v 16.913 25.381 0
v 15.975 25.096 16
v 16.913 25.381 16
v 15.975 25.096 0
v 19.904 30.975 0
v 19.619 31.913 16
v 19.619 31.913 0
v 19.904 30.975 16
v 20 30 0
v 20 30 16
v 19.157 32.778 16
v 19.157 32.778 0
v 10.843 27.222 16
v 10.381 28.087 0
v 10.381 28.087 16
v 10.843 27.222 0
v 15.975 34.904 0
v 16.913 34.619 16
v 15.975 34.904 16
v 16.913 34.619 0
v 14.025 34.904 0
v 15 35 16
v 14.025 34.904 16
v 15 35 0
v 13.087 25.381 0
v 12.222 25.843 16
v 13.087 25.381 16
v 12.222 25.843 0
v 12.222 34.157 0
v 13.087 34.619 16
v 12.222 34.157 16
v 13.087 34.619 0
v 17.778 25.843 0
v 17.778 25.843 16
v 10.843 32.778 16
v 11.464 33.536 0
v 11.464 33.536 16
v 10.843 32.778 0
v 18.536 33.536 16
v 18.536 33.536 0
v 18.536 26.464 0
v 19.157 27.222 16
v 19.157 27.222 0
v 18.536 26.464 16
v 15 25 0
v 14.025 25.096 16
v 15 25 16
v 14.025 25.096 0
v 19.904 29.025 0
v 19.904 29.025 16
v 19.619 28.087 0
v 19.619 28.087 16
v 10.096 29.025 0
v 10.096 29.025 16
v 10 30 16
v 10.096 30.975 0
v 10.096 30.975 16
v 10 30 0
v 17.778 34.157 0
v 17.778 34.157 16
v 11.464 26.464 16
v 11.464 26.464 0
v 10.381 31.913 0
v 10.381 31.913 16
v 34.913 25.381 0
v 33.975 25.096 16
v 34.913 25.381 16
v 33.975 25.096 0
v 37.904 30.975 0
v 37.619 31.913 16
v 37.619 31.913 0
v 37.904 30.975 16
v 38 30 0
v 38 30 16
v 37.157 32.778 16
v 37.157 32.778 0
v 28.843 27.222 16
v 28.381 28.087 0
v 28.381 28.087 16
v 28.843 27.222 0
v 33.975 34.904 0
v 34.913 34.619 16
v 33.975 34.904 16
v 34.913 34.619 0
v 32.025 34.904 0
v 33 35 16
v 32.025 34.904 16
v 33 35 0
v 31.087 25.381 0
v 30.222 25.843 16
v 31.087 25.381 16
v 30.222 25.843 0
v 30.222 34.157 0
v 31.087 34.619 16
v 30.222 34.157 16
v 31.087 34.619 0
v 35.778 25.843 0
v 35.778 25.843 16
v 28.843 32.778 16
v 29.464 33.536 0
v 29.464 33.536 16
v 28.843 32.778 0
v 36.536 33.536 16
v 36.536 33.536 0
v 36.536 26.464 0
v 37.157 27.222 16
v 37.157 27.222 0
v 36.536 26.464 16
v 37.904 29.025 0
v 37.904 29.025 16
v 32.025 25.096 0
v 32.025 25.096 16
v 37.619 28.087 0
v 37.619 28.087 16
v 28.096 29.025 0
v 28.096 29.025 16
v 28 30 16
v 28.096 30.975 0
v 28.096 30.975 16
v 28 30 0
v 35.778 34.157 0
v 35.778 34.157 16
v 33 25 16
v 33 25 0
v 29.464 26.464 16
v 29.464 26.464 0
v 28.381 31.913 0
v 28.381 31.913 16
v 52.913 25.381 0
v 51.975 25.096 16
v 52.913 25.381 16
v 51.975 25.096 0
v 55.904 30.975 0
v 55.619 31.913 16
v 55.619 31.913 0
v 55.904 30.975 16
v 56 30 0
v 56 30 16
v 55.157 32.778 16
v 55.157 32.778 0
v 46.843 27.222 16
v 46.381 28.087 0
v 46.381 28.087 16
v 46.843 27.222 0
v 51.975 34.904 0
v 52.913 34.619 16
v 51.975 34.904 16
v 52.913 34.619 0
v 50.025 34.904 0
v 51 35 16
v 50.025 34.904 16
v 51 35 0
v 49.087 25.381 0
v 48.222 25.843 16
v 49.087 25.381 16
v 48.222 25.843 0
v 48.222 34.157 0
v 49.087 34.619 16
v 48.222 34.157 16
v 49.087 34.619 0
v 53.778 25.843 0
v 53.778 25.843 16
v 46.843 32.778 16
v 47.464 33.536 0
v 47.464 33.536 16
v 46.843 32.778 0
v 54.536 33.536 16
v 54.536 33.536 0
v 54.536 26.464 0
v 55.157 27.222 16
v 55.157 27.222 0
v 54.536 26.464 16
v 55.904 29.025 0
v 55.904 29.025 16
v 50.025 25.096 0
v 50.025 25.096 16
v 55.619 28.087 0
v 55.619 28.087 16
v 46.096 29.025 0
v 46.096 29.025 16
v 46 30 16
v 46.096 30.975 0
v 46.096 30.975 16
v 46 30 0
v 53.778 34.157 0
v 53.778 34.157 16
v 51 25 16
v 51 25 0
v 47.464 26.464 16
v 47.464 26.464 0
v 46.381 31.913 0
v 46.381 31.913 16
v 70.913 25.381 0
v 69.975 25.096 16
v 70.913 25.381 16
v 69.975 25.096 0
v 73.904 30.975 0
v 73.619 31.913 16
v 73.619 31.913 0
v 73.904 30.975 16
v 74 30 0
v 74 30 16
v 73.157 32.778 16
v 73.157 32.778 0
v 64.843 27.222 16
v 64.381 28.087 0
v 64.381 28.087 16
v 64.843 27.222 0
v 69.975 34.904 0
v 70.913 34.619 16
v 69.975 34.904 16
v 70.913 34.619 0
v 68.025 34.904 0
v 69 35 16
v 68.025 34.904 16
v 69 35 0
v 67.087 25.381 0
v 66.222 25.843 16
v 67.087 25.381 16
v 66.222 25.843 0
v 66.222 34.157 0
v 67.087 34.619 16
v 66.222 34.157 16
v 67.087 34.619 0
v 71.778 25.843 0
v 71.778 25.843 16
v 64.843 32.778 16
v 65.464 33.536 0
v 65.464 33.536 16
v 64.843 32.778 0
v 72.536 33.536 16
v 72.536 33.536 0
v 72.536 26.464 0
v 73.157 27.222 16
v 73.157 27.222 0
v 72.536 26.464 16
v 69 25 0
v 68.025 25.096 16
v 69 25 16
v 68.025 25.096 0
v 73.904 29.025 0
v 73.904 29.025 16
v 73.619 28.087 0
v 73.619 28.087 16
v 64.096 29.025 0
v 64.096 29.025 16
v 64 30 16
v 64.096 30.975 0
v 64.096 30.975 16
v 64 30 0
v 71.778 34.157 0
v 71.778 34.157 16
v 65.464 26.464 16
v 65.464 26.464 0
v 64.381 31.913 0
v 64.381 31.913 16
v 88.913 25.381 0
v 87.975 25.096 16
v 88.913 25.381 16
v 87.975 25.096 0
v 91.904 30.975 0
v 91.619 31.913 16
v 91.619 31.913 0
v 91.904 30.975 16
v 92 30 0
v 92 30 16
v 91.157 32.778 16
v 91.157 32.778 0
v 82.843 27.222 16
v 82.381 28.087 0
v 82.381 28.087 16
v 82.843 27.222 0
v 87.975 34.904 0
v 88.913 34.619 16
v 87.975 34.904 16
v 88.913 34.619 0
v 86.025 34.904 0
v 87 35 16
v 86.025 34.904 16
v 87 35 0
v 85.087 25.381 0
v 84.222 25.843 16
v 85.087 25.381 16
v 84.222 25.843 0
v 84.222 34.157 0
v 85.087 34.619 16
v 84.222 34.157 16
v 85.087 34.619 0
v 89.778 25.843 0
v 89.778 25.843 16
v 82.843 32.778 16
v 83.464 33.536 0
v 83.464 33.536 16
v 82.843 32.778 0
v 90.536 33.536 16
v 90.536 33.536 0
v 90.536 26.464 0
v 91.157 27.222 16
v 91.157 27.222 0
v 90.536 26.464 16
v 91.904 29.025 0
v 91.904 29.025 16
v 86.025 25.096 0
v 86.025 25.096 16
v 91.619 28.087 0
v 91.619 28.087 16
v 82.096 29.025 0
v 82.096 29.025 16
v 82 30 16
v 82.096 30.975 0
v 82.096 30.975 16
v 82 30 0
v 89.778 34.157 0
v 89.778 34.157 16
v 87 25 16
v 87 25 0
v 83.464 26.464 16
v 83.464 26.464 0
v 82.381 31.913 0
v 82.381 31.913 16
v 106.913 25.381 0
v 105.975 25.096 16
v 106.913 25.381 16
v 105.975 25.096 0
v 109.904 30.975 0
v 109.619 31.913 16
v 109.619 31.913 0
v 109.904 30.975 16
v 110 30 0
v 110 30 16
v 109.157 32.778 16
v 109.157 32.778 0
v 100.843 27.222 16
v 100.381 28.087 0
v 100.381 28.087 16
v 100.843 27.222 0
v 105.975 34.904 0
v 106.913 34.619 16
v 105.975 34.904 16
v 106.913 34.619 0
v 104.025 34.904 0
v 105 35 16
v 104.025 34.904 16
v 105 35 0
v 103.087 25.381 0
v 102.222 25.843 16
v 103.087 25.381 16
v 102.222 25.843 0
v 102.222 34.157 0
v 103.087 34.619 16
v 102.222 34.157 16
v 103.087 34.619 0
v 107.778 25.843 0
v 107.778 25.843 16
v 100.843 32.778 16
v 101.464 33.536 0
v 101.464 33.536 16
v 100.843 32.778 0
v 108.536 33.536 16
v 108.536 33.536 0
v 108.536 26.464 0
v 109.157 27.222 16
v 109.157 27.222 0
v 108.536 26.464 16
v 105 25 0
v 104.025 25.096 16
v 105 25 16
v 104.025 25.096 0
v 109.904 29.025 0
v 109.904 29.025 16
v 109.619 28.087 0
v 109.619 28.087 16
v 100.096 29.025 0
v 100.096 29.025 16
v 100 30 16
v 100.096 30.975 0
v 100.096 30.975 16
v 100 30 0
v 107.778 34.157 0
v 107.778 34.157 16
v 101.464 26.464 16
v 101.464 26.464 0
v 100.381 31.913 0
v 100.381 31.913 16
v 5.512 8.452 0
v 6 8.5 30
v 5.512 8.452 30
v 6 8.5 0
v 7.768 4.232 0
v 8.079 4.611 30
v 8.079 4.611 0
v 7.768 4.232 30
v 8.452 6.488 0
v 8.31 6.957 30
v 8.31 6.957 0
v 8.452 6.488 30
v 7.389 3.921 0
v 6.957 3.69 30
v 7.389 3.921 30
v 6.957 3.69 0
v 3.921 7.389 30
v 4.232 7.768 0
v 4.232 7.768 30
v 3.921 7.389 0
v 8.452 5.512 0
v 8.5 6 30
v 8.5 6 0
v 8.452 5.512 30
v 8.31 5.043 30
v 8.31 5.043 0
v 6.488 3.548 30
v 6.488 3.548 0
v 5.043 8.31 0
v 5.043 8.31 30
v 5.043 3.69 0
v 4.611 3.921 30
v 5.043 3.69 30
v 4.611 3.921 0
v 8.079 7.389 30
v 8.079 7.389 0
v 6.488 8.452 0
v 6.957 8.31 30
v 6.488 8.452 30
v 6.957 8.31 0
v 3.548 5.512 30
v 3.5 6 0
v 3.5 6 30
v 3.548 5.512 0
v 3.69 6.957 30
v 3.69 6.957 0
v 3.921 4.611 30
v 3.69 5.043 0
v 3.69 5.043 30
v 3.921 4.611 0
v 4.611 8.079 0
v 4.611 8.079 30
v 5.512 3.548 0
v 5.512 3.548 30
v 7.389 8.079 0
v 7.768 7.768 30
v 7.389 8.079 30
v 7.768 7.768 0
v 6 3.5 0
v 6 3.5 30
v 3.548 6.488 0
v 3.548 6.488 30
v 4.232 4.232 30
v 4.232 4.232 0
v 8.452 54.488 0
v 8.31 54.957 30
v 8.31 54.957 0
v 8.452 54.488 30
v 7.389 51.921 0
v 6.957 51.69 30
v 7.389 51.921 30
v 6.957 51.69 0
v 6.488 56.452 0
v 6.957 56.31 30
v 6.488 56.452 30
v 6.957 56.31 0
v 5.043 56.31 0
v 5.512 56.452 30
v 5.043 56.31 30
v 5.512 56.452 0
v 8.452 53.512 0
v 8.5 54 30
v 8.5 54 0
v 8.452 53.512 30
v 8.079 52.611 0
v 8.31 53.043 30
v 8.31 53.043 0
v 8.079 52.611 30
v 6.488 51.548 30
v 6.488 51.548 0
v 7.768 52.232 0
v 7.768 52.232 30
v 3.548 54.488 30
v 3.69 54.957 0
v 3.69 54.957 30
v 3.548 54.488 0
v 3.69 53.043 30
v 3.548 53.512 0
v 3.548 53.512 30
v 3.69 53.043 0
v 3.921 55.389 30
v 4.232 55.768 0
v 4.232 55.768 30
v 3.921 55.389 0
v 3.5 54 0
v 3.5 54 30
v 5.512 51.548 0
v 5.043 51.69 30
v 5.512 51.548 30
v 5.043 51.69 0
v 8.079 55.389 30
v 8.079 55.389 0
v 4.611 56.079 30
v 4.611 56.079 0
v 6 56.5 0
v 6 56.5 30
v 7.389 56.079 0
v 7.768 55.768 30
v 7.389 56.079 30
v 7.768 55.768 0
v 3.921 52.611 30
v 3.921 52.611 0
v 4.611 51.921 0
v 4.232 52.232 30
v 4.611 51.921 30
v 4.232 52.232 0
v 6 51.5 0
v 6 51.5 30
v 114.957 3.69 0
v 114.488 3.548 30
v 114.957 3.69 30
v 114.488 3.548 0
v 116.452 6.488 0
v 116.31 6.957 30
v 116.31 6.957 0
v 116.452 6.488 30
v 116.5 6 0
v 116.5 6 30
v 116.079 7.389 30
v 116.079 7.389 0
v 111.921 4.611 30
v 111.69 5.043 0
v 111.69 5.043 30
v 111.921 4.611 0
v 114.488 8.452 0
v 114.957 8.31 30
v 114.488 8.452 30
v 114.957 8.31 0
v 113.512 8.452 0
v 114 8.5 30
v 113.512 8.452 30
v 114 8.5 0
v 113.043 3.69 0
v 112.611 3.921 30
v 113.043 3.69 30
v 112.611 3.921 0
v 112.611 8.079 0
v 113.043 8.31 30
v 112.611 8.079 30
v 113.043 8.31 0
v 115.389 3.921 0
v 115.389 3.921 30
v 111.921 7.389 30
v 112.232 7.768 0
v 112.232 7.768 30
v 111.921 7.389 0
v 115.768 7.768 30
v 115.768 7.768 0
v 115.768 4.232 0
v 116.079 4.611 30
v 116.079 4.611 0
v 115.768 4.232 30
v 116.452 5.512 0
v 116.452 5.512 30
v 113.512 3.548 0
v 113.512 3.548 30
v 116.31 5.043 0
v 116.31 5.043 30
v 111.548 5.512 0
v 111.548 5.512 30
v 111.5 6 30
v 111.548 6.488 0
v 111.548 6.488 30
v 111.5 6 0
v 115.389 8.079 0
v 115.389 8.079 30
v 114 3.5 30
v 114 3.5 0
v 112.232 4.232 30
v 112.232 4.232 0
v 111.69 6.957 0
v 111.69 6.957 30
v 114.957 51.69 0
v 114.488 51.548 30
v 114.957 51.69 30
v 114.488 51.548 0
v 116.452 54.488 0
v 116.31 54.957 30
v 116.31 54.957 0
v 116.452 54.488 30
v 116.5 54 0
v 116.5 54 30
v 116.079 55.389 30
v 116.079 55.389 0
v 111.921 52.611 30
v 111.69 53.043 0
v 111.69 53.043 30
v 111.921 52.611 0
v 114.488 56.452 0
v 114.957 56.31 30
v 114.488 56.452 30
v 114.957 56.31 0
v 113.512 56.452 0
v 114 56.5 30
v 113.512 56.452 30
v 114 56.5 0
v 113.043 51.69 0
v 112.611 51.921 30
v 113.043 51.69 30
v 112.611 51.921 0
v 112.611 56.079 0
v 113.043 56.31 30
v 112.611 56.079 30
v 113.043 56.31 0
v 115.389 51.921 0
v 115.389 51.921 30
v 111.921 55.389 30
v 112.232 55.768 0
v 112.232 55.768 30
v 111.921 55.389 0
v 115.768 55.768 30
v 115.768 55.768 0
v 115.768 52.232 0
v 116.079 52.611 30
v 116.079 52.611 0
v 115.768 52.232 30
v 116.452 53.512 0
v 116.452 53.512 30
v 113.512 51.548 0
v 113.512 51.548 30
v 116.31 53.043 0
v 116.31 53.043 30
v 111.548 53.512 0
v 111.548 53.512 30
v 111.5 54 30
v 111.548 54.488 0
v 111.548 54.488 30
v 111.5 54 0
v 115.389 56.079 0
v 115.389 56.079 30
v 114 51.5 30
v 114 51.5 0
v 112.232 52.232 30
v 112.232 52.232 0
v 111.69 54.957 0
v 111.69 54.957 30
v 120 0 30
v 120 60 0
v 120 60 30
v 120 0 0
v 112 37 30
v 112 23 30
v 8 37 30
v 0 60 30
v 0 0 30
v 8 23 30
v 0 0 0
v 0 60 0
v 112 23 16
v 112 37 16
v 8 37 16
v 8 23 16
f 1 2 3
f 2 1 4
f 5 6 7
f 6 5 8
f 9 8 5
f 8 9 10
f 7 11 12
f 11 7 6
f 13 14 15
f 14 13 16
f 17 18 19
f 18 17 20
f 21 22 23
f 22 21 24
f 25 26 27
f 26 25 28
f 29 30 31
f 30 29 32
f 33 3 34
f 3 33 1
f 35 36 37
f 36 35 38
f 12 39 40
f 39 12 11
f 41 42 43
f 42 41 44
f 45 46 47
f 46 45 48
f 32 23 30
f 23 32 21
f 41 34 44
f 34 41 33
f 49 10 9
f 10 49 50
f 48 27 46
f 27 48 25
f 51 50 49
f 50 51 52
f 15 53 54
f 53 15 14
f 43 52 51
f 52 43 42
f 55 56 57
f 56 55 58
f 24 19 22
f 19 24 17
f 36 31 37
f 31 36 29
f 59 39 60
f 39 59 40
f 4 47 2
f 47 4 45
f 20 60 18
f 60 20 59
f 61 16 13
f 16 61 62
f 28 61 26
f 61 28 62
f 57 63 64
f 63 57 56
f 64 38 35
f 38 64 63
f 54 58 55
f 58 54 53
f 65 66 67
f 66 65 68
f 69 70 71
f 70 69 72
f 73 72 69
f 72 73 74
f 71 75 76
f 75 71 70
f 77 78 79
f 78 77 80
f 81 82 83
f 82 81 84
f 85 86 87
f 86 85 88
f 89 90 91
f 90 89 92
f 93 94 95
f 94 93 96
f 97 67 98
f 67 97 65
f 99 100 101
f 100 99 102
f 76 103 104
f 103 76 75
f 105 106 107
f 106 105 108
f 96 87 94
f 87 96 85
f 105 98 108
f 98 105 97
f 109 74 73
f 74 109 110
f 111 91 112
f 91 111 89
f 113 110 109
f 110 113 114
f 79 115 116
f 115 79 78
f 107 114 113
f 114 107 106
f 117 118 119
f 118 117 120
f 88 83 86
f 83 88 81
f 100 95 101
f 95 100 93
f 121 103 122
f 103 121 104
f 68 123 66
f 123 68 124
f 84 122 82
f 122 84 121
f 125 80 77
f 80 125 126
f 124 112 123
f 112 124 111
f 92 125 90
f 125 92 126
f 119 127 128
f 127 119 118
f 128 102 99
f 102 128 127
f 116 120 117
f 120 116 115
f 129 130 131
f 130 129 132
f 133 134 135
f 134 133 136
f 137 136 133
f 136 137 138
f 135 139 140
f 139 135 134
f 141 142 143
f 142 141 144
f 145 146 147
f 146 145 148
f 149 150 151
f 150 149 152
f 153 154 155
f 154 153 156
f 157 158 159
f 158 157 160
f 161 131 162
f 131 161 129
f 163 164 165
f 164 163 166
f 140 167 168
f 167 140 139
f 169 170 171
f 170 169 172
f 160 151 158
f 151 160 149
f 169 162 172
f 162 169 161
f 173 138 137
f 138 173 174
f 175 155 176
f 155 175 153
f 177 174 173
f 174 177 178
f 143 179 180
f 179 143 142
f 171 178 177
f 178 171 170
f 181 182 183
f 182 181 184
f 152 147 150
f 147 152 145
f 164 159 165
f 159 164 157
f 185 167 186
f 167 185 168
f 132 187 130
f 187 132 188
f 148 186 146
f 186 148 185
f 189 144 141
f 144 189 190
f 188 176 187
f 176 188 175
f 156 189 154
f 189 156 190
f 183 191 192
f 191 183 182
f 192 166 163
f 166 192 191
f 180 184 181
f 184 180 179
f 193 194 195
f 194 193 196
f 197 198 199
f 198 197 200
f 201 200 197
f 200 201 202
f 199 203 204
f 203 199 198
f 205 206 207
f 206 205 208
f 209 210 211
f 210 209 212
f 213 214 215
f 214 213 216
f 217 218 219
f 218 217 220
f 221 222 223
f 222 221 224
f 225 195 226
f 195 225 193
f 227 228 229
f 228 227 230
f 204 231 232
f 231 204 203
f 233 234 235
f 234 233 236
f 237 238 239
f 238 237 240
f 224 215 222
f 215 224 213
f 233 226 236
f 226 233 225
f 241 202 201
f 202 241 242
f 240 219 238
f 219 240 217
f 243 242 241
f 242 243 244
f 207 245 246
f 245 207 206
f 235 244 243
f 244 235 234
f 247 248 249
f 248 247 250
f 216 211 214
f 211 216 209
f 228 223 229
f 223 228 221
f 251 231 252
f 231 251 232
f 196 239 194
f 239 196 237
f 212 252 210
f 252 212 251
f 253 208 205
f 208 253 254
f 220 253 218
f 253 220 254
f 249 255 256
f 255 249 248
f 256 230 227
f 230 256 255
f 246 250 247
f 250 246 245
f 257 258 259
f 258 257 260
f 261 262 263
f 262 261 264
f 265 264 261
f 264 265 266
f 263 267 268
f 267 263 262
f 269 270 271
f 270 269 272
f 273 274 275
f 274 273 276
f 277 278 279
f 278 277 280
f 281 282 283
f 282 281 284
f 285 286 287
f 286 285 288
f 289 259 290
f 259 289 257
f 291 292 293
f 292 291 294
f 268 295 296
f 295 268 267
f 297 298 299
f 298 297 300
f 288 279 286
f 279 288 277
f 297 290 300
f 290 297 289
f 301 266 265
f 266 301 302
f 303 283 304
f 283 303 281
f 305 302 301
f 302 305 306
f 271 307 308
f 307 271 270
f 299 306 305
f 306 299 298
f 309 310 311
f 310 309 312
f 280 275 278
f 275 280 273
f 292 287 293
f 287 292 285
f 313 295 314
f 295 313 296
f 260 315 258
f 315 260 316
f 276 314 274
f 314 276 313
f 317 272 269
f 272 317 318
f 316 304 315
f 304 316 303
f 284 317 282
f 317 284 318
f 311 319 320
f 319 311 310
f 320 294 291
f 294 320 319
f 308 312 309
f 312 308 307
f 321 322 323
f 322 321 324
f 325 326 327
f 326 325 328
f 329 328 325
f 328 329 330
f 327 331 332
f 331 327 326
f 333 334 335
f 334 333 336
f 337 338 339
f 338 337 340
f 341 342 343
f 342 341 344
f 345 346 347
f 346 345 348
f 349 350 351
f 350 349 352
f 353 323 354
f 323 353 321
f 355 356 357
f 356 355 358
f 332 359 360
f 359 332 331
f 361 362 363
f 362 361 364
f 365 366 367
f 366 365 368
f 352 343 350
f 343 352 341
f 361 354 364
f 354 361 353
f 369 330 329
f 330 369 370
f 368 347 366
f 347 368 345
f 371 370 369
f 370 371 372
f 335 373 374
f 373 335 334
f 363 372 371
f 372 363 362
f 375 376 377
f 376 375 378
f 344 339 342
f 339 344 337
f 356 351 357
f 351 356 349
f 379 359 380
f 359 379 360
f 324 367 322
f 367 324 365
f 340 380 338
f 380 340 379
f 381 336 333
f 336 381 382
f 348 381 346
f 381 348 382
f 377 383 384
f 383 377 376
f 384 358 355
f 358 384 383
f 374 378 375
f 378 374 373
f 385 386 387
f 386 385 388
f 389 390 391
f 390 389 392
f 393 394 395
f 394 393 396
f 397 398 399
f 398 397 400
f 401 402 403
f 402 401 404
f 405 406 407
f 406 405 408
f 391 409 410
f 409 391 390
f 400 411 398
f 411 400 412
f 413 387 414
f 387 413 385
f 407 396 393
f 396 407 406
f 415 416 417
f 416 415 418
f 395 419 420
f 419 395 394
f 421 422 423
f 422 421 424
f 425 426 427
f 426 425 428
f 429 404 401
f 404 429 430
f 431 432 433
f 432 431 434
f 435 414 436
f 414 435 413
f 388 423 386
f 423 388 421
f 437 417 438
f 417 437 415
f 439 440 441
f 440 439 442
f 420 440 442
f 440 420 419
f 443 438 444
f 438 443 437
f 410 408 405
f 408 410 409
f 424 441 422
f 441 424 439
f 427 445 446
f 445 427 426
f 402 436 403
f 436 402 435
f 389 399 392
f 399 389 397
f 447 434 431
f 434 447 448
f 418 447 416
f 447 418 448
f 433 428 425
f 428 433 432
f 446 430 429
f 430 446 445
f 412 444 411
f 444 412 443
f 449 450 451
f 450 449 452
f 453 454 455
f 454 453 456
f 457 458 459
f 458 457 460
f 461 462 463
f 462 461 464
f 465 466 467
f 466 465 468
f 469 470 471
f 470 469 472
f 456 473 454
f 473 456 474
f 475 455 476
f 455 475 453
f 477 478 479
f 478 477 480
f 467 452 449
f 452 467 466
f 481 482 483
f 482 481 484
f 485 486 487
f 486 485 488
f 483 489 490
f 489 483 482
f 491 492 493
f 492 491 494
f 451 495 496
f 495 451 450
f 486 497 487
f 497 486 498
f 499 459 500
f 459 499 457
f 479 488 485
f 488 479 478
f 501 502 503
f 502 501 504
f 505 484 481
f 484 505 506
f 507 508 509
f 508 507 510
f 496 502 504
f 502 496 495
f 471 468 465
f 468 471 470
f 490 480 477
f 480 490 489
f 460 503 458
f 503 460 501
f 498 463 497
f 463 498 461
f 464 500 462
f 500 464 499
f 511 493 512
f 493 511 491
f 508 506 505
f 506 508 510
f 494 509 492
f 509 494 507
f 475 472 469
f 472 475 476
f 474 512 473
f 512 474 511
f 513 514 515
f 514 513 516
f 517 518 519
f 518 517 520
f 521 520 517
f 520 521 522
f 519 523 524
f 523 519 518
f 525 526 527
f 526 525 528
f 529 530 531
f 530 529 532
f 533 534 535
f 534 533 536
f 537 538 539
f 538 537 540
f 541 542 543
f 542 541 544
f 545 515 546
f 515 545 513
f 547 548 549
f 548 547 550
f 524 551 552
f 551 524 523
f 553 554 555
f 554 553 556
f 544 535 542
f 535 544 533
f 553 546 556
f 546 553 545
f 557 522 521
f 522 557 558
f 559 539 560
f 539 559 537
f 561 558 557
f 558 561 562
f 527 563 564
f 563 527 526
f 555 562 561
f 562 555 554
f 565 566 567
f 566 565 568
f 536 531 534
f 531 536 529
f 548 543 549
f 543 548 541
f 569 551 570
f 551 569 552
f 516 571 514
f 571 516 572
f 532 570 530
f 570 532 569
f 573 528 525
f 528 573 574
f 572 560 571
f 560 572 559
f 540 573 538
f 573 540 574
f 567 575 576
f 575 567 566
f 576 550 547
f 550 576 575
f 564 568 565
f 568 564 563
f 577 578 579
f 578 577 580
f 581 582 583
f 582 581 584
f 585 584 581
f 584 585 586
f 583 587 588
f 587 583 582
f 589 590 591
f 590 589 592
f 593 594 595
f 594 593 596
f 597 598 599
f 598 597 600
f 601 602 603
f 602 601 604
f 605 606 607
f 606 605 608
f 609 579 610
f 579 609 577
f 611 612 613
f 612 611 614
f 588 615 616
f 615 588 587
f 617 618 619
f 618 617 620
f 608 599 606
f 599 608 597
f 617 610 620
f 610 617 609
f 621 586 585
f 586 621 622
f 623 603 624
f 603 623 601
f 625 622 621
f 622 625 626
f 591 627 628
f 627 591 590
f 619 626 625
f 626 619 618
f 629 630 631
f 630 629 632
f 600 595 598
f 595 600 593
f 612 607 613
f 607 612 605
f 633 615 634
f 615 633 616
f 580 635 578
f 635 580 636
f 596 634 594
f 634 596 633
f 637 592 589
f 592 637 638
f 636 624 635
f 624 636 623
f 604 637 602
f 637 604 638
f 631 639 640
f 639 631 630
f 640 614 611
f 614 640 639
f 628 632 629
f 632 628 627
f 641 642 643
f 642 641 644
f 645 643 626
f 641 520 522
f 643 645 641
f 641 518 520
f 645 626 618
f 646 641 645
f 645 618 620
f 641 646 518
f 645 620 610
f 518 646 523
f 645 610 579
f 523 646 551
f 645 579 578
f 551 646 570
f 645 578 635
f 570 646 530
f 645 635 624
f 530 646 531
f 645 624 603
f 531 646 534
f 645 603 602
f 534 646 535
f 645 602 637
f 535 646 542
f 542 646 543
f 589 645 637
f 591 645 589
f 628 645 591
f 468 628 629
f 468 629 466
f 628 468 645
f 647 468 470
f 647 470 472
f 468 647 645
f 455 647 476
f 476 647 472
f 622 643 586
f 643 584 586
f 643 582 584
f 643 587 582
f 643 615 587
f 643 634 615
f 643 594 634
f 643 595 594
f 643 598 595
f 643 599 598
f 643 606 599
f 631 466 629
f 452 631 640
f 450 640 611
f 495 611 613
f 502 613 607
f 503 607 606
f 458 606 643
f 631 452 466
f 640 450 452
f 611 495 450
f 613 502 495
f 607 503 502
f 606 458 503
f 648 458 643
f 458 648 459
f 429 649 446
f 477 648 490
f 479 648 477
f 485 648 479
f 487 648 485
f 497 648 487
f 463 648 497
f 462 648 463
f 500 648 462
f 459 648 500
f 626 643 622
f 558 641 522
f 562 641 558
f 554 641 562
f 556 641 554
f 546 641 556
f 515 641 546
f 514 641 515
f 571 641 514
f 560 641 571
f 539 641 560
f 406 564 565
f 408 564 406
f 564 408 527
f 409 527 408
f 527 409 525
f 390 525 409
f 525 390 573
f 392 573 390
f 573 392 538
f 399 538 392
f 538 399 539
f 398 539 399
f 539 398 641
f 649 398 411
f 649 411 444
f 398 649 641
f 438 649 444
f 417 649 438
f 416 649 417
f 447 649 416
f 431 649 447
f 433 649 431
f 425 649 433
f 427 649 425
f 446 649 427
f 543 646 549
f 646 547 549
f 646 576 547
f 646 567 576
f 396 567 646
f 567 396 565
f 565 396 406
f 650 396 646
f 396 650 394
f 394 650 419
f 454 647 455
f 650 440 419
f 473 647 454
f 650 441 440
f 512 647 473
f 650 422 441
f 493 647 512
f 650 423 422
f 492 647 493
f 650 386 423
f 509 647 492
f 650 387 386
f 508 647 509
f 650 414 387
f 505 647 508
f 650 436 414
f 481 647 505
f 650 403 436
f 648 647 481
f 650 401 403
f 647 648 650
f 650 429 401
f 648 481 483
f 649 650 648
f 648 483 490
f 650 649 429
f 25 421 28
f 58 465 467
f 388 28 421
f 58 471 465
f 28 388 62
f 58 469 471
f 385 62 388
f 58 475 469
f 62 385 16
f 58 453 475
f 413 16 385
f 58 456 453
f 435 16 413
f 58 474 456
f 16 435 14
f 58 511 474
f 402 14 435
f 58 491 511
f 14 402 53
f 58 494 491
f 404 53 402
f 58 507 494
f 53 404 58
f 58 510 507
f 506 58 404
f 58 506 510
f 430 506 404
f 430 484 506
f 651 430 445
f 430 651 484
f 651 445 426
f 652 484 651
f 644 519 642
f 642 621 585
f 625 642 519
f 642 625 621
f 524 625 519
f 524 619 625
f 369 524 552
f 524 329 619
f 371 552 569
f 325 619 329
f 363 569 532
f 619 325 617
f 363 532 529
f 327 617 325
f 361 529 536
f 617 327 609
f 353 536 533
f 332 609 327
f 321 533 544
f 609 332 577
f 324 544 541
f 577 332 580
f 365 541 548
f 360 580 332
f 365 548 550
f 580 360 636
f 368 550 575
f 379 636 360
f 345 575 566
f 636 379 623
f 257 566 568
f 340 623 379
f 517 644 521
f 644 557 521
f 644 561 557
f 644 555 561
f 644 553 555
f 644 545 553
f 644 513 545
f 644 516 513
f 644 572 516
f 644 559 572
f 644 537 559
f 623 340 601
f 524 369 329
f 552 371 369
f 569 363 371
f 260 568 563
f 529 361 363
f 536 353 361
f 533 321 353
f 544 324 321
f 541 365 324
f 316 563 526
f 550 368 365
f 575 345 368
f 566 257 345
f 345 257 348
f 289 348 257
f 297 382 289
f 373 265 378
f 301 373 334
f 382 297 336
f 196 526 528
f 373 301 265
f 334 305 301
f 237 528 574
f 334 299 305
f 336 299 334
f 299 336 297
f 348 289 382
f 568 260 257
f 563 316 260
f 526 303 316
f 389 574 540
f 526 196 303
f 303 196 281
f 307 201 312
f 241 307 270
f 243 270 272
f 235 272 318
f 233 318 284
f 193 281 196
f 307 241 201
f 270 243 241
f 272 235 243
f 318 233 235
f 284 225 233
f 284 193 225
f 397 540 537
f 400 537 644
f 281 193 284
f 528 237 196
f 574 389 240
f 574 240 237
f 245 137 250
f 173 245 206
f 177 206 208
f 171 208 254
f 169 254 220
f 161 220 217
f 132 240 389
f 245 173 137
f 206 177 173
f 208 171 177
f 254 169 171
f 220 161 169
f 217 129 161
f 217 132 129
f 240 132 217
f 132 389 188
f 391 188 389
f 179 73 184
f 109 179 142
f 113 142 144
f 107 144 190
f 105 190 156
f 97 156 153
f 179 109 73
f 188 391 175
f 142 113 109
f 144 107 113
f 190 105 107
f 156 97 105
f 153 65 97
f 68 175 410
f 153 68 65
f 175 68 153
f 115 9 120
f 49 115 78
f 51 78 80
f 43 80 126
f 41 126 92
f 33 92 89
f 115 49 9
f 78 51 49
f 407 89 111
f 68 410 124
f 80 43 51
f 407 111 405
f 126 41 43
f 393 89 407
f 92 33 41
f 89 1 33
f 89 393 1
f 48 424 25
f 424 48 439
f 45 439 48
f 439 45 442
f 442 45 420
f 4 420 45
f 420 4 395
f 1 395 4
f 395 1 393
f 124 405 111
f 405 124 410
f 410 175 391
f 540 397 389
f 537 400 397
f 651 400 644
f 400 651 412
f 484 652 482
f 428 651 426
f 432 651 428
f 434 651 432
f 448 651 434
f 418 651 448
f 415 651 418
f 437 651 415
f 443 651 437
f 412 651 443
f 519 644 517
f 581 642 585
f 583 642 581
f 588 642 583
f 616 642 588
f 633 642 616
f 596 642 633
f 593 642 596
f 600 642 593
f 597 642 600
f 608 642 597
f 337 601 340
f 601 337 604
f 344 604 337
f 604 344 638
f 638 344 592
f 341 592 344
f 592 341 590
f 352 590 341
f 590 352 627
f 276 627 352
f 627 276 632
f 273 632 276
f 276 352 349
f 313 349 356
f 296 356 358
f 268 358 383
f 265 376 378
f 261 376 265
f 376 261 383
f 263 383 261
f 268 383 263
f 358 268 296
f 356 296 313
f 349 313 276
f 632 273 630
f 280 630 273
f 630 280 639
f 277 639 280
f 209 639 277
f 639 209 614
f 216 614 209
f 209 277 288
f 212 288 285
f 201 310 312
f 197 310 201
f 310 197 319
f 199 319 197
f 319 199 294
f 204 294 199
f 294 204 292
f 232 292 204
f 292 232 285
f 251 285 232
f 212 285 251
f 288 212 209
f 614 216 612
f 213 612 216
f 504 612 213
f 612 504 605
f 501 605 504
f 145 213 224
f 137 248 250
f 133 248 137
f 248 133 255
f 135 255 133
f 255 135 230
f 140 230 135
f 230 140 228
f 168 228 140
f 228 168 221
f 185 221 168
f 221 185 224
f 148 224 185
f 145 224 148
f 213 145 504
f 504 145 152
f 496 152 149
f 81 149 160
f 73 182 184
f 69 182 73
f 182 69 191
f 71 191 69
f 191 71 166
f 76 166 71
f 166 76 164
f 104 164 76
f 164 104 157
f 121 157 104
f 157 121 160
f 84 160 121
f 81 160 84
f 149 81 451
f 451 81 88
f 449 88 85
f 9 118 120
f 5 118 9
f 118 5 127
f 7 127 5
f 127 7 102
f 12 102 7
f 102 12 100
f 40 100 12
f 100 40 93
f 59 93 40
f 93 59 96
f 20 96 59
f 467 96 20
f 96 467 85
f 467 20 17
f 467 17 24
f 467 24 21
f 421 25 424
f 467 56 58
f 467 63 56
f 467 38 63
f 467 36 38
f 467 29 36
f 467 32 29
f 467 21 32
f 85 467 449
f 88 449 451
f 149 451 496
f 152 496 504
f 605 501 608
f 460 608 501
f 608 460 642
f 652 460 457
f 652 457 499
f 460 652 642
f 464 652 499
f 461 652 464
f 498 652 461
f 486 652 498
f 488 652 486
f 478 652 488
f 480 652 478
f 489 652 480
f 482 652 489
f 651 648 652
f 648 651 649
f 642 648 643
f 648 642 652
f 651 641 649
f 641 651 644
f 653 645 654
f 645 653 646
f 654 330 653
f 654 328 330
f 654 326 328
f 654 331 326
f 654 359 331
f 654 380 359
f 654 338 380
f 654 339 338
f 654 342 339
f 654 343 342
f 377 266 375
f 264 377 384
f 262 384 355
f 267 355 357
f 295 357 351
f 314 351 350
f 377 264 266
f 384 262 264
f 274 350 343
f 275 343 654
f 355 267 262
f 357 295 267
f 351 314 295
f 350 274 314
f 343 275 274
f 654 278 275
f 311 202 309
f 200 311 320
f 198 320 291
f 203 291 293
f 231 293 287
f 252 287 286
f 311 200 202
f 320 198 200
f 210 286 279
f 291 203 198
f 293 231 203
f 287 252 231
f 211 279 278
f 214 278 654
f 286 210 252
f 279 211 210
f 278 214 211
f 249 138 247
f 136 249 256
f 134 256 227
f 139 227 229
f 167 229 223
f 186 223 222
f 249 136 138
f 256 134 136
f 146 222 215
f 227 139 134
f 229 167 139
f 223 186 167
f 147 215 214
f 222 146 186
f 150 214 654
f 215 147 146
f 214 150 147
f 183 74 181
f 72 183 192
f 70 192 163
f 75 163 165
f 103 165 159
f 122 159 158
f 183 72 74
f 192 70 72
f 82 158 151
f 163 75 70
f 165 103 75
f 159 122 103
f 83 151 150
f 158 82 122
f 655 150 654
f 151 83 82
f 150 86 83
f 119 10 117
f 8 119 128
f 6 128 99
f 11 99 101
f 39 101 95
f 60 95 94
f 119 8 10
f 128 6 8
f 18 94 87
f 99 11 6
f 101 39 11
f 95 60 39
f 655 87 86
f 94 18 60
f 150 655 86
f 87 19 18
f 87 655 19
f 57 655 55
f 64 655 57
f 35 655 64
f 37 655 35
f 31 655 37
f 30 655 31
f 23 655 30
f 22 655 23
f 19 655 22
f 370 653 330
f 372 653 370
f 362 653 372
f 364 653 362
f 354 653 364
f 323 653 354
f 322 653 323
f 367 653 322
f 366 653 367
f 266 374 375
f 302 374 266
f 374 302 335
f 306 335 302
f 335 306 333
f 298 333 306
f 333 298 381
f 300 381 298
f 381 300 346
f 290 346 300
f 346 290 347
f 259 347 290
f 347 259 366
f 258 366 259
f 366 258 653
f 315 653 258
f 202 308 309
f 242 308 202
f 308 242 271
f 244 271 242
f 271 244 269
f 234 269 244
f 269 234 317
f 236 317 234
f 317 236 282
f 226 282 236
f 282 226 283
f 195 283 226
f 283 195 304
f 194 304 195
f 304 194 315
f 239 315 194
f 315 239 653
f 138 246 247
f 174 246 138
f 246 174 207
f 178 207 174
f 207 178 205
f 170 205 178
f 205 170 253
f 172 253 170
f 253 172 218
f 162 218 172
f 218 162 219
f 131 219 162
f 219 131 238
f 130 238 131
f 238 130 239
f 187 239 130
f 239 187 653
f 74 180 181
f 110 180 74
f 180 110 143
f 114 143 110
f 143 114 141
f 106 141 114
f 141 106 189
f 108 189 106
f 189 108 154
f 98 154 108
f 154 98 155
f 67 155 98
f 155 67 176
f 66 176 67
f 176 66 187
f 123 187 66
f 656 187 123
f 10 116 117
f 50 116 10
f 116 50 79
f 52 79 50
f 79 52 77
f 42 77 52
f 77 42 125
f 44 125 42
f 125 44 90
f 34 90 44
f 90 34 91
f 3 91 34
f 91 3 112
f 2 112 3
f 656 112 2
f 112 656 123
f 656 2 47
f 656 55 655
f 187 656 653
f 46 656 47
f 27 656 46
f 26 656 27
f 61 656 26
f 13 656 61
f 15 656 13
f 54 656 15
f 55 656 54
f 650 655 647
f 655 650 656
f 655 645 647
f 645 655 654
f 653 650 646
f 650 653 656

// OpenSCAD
$fn = 32;

// ----------------------------------------------------------------------
// Manifold block: gallery_top manifold
// ----------------------------------------------------------------------

// --- parameters (mm) ---
block_l = 120;            // block length, X
block_w = 60;             // block width, Y
block_h = 30;             // block height, Z
port_d = 10;              // port bore diameter
port_pitch = 18;          // port pitch along X
gallery_d = 14;           // top gallery width, Y
gallery_depth = 14;       // gallery pocket depth
wall_p = 8;               // gallery end wall thickness, X
mnt_d = 5;                // mounting hole diameter
mnt_in = 6;               // mounting hole inset from the edges
fit_tol = 0.1;            // tolerance for press fits, mm
free_tol = 0.3;           // tolerance for clearance fits, mm

n_ports = 6;  // ports in the row
port_x0 = (block_l - (n_ports - 1) * port_pitch) / 2;  // first port X

difference() {
  cube([block_l, block_w, block_h]);
  for (i = [0 : n_ports - 1])
    translate([port_x0 + i * port_pitch, block_w / 2, -1])
      cylinder(h = block_h + 2, d = port_d);
  translate([wall_p, block_w / 2 - gallery_d / 2, block_h - gallery_depth])
    cube([block_l - 2 * wall_p, gallery_d, gallery_depth + 1]);
  for (cx = [mnt_in, block_l - mnt_in])
    for (cy = [mnt_in, block_w - mnt_in])
      translate([cx, cy, -1]) cylinder(h = block_h + 2, d = mnt_d);
}
